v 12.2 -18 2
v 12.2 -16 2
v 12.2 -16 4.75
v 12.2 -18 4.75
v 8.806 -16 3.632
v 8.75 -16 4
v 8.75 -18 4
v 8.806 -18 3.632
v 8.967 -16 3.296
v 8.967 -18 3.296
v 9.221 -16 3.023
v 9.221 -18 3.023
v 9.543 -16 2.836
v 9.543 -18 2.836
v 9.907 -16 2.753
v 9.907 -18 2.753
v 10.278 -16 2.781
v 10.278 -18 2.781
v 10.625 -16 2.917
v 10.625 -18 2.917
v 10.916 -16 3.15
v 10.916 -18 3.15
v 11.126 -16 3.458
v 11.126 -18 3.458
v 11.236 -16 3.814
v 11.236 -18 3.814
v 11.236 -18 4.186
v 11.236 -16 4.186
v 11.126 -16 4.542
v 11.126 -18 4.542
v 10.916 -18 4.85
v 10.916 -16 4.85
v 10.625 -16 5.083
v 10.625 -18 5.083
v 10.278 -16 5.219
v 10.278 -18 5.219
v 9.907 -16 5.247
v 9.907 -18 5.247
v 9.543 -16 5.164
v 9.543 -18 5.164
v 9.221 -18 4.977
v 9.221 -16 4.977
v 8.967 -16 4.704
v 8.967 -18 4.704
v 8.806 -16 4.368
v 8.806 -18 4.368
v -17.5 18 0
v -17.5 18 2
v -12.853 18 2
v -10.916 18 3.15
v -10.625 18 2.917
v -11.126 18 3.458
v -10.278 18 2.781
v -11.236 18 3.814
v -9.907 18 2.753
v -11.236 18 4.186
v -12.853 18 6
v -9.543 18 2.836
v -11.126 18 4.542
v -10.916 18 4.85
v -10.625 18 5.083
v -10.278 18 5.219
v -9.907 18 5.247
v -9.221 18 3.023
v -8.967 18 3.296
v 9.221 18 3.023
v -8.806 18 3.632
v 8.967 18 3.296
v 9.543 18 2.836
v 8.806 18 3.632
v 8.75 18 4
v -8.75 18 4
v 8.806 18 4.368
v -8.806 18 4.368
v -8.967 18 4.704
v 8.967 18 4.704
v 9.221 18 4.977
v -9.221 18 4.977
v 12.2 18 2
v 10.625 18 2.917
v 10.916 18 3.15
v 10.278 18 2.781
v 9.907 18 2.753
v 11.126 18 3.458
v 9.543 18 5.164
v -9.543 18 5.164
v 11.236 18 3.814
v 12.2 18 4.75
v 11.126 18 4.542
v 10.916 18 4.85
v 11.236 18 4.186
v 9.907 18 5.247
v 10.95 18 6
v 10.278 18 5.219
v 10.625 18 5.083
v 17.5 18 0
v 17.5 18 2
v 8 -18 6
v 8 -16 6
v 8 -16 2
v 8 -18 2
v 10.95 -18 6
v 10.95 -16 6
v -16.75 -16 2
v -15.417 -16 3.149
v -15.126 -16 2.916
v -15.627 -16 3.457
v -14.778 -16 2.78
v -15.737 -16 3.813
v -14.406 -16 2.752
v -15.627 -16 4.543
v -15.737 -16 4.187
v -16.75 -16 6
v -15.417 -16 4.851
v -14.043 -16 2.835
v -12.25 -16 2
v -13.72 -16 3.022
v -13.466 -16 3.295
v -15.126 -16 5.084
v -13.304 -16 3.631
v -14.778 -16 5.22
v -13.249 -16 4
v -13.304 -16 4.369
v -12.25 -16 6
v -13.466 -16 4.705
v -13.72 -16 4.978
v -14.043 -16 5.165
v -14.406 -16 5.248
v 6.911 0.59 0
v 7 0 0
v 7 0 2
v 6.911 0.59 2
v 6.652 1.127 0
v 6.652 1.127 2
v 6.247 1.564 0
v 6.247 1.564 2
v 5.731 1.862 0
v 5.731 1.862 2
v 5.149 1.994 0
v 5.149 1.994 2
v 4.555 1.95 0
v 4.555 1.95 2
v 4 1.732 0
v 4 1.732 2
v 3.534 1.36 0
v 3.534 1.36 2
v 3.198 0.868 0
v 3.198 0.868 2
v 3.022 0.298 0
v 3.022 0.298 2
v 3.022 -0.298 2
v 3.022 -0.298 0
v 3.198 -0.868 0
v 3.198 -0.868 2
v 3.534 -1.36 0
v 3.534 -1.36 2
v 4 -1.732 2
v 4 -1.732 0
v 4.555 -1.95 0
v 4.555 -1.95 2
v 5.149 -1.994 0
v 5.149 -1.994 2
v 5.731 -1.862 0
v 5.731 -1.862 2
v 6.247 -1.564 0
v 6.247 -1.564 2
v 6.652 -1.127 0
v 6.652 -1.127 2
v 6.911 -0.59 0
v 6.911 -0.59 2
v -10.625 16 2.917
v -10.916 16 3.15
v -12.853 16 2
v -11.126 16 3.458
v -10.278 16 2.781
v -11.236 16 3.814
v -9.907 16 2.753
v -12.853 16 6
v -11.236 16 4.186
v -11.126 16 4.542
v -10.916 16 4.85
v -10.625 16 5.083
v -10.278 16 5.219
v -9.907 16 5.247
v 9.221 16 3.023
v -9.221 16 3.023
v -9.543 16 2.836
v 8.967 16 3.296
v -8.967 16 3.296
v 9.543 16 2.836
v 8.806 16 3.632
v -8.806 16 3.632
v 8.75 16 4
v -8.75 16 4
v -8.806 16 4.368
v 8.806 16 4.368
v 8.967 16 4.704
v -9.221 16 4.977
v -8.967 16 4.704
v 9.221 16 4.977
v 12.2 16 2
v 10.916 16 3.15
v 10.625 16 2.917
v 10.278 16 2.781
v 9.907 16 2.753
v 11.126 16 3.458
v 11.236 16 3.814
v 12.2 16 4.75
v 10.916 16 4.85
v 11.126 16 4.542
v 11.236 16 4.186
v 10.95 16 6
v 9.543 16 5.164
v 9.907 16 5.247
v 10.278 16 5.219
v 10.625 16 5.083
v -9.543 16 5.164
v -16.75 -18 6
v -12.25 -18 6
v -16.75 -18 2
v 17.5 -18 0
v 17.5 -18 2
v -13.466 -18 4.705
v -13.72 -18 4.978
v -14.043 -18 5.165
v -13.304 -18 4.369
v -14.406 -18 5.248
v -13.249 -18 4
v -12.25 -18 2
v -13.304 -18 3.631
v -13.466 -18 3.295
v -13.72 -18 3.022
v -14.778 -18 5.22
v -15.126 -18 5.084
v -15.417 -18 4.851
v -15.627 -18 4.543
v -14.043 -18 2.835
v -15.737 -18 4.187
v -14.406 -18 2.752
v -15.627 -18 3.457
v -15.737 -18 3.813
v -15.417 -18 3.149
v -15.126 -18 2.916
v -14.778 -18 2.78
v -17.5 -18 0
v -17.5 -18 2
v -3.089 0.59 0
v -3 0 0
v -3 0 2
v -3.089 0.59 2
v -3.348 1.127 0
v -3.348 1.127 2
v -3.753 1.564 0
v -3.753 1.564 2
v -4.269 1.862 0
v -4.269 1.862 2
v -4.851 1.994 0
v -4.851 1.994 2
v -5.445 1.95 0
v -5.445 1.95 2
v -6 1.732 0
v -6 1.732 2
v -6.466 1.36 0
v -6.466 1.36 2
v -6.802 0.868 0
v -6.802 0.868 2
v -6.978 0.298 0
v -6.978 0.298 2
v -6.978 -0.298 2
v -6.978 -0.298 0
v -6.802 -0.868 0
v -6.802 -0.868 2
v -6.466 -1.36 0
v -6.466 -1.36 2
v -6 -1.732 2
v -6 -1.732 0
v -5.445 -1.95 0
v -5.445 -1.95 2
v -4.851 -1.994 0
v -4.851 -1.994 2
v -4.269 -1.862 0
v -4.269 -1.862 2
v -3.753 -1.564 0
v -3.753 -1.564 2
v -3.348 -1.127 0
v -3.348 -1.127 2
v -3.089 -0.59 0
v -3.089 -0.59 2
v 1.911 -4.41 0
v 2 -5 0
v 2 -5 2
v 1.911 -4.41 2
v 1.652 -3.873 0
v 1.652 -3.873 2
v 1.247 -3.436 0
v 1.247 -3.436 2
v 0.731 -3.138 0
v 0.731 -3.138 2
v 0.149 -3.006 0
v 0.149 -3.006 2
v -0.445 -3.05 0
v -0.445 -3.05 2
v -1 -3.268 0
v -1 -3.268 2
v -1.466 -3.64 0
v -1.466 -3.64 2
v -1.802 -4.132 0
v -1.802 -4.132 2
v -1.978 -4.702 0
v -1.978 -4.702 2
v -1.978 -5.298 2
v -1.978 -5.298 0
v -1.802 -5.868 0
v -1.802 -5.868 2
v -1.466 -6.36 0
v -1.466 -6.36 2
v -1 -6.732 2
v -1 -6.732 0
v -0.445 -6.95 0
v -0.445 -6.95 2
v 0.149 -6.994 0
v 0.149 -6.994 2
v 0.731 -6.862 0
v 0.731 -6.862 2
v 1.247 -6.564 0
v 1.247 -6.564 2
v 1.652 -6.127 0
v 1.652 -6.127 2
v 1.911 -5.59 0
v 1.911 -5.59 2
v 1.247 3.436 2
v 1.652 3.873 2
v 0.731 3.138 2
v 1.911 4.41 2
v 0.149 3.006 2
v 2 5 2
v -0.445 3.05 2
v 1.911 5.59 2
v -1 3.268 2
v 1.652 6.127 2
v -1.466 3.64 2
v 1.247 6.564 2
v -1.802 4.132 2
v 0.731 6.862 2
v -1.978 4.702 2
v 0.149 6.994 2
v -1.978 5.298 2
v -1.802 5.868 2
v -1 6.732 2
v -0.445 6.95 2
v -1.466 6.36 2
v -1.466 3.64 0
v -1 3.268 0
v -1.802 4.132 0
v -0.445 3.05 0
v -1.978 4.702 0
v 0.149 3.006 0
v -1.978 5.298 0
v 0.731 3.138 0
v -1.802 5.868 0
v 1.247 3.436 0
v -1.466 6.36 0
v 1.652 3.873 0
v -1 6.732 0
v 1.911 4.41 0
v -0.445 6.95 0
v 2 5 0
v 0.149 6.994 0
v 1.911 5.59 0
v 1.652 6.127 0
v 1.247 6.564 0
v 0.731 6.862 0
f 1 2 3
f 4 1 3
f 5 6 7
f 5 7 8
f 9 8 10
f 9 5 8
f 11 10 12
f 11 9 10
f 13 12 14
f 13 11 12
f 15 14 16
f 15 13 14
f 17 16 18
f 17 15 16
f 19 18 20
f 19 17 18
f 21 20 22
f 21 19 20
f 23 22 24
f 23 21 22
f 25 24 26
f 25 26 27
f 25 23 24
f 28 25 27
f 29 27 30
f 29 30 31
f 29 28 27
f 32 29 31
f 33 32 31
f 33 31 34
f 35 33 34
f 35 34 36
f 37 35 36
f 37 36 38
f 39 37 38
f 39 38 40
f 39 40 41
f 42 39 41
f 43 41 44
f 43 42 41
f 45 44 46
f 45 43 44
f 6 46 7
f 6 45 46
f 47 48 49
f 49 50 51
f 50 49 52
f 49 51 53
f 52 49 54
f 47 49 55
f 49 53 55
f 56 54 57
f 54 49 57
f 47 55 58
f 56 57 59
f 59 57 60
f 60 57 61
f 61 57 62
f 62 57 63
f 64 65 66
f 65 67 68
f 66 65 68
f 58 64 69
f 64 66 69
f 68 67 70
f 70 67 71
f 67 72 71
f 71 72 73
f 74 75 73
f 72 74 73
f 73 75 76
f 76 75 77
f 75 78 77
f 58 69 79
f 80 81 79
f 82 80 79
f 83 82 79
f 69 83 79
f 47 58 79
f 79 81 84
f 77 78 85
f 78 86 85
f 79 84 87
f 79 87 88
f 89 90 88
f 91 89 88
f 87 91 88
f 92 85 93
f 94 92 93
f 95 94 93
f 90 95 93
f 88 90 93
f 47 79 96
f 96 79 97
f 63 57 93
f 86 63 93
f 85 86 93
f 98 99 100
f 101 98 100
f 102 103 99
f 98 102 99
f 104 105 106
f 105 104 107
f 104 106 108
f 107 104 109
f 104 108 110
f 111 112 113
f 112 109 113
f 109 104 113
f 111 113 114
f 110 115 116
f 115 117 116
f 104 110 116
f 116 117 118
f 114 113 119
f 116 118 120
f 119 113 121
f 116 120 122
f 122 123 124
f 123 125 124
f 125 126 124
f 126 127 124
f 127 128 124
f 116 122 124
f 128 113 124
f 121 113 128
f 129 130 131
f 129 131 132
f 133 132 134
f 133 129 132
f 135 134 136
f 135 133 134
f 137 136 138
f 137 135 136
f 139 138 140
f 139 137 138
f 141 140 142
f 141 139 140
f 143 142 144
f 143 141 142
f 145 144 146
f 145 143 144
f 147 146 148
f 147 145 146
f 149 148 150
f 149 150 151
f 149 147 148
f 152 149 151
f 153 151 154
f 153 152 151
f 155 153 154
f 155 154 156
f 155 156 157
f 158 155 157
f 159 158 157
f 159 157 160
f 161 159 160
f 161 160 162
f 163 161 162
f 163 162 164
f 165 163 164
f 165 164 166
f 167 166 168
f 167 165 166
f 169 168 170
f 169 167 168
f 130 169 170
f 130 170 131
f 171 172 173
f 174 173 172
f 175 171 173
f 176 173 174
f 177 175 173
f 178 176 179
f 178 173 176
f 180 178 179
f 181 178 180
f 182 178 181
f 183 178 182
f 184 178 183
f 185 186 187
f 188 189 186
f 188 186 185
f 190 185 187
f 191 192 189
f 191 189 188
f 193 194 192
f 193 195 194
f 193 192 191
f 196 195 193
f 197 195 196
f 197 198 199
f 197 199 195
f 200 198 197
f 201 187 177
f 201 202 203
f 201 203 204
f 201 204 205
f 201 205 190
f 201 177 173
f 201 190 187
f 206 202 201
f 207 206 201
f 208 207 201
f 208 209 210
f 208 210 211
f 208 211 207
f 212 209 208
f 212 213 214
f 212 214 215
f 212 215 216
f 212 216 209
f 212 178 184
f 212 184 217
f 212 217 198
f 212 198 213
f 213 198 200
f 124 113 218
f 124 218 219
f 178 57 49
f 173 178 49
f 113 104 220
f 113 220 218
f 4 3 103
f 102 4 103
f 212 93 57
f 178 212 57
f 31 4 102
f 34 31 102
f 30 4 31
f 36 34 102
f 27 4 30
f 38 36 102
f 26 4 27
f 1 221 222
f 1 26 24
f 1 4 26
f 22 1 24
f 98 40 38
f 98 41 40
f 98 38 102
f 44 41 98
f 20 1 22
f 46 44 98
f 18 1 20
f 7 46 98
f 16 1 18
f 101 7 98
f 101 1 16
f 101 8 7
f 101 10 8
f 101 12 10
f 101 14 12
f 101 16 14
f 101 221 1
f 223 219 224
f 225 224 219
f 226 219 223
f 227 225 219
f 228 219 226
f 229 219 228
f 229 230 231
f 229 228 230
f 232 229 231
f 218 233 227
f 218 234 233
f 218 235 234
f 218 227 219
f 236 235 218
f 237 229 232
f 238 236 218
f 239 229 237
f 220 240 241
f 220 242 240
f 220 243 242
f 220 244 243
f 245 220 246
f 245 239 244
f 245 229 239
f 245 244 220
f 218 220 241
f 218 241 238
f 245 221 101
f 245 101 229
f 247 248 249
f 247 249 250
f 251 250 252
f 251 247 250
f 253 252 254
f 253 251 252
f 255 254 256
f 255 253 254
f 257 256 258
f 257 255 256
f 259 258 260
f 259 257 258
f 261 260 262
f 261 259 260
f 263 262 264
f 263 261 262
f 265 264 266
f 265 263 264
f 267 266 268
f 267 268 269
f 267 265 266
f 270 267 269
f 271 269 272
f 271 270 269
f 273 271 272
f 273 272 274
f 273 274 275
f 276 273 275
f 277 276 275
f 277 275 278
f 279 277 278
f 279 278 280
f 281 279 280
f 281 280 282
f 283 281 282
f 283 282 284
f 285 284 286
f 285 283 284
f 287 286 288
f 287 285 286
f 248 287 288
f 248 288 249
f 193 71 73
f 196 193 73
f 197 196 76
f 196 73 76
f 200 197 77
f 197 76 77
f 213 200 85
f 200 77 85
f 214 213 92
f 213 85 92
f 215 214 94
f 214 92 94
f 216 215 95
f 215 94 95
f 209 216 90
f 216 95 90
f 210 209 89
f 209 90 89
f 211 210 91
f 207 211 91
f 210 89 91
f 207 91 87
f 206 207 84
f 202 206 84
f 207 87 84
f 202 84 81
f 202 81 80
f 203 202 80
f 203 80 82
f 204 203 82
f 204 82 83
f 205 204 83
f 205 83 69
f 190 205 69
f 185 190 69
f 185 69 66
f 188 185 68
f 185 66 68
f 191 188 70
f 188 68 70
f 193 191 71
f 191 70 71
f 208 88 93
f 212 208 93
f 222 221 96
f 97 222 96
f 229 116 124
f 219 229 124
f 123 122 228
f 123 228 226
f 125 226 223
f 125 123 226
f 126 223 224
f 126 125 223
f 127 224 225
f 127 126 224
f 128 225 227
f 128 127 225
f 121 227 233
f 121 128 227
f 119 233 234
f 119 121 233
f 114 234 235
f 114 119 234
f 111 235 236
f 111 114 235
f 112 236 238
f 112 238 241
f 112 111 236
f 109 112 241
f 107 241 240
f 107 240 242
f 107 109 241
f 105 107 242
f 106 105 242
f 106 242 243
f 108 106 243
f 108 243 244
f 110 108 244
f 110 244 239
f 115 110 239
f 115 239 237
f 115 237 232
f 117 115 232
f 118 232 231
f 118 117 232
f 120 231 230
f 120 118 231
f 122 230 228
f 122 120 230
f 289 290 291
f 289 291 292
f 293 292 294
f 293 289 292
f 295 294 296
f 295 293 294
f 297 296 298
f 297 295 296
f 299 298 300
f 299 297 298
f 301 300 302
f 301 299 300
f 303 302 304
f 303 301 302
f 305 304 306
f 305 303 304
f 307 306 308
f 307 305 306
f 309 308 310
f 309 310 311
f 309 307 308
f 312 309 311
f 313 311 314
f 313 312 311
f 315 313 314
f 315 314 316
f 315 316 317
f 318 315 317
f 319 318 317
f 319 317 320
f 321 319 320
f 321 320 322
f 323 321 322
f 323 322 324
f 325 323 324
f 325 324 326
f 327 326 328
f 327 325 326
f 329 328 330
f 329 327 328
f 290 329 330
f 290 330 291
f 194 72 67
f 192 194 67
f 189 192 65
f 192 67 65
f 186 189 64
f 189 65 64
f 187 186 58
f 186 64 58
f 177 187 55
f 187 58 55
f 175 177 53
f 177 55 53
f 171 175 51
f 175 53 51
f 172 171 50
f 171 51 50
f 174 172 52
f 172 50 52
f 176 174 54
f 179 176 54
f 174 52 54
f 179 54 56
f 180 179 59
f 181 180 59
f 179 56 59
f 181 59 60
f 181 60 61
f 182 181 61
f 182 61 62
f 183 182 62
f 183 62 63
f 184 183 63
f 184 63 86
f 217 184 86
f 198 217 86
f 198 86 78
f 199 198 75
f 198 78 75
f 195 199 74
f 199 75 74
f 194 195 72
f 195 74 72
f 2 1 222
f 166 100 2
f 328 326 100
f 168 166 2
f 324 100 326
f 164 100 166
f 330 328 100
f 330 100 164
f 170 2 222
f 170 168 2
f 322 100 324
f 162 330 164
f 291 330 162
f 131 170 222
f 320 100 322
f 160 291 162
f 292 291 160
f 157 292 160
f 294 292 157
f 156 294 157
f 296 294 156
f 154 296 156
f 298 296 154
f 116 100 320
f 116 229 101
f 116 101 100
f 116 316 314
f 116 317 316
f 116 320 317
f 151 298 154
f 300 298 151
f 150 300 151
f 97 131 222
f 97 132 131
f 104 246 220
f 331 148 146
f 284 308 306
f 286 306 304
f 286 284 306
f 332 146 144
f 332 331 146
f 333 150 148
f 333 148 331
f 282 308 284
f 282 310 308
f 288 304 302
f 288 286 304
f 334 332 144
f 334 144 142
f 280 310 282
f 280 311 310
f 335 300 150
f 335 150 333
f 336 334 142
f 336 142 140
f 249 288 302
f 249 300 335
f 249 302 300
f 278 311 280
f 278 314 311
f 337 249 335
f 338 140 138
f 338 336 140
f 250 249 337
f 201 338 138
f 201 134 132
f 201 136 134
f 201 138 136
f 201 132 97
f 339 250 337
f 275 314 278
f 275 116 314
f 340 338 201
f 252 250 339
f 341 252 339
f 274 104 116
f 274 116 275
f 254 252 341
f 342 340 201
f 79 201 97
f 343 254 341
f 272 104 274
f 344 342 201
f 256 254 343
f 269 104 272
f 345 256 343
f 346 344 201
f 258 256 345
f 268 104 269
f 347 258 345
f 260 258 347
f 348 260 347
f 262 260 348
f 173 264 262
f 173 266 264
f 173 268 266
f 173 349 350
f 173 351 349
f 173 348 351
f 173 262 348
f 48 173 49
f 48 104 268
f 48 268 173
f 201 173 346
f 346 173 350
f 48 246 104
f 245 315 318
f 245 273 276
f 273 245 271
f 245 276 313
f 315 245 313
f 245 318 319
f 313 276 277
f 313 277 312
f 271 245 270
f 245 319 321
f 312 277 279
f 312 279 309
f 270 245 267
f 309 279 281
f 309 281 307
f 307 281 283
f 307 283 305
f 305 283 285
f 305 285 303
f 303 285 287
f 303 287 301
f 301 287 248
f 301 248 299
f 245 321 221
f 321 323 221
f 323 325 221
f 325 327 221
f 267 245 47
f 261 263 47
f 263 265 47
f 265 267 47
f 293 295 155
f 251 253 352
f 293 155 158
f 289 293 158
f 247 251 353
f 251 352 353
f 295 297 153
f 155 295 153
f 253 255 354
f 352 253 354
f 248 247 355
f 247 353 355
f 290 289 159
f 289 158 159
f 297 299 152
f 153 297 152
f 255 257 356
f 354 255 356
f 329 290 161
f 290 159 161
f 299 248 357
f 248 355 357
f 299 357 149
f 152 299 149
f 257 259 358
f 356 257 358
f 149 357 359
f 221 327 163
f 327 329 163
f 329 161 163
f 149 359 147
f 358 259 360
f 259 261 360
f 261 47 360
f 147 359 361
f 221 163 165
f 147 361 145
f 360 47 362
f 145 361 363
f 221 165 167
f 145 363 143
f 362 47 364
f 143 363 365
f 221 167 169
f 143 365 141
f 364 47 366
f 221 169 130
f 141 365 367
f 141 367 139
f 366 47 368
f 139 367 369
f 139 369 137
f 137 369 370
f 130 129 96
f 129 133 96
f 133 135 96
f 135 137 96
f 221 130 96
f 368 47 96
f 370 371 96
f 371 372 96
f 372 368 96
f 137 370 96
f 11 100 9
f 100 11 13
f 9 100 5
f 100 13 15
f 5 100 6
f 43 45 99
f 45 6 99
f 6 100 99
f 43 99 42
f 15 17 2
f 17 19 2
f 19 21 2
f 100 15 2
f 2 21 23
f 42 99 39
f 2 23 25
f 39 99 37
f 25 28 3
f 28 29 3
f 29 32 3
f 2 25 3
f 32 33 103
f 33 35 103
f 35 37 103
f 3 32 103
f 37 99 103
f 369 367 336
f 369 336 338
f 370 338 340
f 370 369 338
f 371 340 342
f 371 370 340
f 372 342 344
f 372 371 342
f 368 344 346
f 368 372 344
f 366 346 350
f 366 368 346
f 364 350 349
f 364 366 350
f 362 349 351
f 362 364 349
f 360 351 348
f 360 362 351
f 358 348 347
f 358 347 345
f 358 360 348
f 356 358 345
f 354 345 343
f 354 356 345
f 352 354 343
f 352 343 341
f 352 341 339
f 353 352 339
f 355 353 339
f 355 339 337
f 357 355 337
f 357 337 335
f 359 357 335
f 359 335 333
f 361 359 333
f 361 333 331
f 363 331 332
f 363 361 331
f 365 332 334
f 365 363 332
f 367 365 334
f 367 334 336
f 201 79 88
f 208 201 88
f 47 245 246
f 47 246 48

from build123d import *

# Parameters (mm, degrees)
CROQUIS1_W              = 36
CROQUIS1_H              = 35
CROQUIS1_R              = 2
SALIENTE_EXTRUIR1_DEPTH = 2
CROQUIS2_R              = 1.25
SALIENTE_EXTRUIR2_DEPTH = 2
SALIENTE_EXTRUIR3_START = -2
CROQUIS3_W              = 4.5
CROQUIS3_H              = 6
CROQUIS3_R              = 1.25140183
CROQUIS3_R_2            = 1.25
SALIENTE_EXTRUIR3_DEPTH = 2


with BuildPart() as part:
    # Croquis1 → Saliente-Extruir1 (new body)
    with BuildSketch(Plane(origin=(0, 0, 0), x_dir=(0, 1, 0), z_dir=(0, 0, 1))):
        Rectangle(CROQUIS1_W, CROQUIS1_H)
        with Locations(Location((0, 5, 0), (0, 0, 270))):
            Circle(CROQUIS1_R, mode=Mode.SUBTRACT)
        with Locations(Location((5, 0, 0), (0, 0, 270))):
            Circle(CROQUIS1_R, mode=Mode.SUBTRACT)
        with Locations(Location((0, -5, 0), (0, 0, 270))):
            Circle(CROQUIS1_R, mode=Mode.SUBTRACT)
        with Locations(Location((-5, 0, 0), (0, 0, 270))):
            Circle(CROQUIS1_R, mode=Mode.SUBTRACT)
    extrude(amount=SALIENTE_EXTRUIR1_DEPTH)

    # Croquis2 → Saliente-Extruir2 (add)
    with BuildSketch(Plane(origin=(0, 18, 0), x_dir=(-1, 0, 0), z_dir=(0, 1, 0))):
        Polygon((-10.95, 6), (12.85345456, 6), (12.85345456, 0), (-12.2, 0), (-12.2, 4.75), align=None)
        with Locations((-10, 4)):
            Circle(CROQUIS2_R, mode=Mode.SUBTRACT)
        with Locations(Location((10, 4, 0), (0, 0, 180))):
            Circle(CROQUIS2_R, mode=Mode.SUBTRACT)
    extrude(amount=-SALIENTE_EXTRUIR2_DEPTH)

    # Croquis3 → Saliente-Extruir3 (add)
    # profile 1 of 2: a face of its own
    with BuildSketch(Plane.XZ.offset(18).offset(SALIENTE_EXTRUIR3_START)):
        with Locations((-14.5, 3)):
            Rectangle(CROQUIS3_W, CROQUIS3_H)
        with Locations((-14.5, 4)):
            Circle(CROQUIS3_R, mode=Mode.SUBTRACT)
    # profile 2 of 2: a face of its own
    with BuildSketch(Plane.XZ.offset(18).offset(SALIENTE_EXTRUIR3_START)):
        Polygon((12.2, 4.75), (10.95, 6), (8, 6), (8, 2), (12.2, 2), align=None)
        with Locations(Location((10, 4, 0), (0, 0, 180))):
            Circle(CROQUIS3_R_2, mode=Mode.SUBTRACT)
    extrude(amount=SALIENTE_EXTRUIR3_DEPTH)


solid = part.part
